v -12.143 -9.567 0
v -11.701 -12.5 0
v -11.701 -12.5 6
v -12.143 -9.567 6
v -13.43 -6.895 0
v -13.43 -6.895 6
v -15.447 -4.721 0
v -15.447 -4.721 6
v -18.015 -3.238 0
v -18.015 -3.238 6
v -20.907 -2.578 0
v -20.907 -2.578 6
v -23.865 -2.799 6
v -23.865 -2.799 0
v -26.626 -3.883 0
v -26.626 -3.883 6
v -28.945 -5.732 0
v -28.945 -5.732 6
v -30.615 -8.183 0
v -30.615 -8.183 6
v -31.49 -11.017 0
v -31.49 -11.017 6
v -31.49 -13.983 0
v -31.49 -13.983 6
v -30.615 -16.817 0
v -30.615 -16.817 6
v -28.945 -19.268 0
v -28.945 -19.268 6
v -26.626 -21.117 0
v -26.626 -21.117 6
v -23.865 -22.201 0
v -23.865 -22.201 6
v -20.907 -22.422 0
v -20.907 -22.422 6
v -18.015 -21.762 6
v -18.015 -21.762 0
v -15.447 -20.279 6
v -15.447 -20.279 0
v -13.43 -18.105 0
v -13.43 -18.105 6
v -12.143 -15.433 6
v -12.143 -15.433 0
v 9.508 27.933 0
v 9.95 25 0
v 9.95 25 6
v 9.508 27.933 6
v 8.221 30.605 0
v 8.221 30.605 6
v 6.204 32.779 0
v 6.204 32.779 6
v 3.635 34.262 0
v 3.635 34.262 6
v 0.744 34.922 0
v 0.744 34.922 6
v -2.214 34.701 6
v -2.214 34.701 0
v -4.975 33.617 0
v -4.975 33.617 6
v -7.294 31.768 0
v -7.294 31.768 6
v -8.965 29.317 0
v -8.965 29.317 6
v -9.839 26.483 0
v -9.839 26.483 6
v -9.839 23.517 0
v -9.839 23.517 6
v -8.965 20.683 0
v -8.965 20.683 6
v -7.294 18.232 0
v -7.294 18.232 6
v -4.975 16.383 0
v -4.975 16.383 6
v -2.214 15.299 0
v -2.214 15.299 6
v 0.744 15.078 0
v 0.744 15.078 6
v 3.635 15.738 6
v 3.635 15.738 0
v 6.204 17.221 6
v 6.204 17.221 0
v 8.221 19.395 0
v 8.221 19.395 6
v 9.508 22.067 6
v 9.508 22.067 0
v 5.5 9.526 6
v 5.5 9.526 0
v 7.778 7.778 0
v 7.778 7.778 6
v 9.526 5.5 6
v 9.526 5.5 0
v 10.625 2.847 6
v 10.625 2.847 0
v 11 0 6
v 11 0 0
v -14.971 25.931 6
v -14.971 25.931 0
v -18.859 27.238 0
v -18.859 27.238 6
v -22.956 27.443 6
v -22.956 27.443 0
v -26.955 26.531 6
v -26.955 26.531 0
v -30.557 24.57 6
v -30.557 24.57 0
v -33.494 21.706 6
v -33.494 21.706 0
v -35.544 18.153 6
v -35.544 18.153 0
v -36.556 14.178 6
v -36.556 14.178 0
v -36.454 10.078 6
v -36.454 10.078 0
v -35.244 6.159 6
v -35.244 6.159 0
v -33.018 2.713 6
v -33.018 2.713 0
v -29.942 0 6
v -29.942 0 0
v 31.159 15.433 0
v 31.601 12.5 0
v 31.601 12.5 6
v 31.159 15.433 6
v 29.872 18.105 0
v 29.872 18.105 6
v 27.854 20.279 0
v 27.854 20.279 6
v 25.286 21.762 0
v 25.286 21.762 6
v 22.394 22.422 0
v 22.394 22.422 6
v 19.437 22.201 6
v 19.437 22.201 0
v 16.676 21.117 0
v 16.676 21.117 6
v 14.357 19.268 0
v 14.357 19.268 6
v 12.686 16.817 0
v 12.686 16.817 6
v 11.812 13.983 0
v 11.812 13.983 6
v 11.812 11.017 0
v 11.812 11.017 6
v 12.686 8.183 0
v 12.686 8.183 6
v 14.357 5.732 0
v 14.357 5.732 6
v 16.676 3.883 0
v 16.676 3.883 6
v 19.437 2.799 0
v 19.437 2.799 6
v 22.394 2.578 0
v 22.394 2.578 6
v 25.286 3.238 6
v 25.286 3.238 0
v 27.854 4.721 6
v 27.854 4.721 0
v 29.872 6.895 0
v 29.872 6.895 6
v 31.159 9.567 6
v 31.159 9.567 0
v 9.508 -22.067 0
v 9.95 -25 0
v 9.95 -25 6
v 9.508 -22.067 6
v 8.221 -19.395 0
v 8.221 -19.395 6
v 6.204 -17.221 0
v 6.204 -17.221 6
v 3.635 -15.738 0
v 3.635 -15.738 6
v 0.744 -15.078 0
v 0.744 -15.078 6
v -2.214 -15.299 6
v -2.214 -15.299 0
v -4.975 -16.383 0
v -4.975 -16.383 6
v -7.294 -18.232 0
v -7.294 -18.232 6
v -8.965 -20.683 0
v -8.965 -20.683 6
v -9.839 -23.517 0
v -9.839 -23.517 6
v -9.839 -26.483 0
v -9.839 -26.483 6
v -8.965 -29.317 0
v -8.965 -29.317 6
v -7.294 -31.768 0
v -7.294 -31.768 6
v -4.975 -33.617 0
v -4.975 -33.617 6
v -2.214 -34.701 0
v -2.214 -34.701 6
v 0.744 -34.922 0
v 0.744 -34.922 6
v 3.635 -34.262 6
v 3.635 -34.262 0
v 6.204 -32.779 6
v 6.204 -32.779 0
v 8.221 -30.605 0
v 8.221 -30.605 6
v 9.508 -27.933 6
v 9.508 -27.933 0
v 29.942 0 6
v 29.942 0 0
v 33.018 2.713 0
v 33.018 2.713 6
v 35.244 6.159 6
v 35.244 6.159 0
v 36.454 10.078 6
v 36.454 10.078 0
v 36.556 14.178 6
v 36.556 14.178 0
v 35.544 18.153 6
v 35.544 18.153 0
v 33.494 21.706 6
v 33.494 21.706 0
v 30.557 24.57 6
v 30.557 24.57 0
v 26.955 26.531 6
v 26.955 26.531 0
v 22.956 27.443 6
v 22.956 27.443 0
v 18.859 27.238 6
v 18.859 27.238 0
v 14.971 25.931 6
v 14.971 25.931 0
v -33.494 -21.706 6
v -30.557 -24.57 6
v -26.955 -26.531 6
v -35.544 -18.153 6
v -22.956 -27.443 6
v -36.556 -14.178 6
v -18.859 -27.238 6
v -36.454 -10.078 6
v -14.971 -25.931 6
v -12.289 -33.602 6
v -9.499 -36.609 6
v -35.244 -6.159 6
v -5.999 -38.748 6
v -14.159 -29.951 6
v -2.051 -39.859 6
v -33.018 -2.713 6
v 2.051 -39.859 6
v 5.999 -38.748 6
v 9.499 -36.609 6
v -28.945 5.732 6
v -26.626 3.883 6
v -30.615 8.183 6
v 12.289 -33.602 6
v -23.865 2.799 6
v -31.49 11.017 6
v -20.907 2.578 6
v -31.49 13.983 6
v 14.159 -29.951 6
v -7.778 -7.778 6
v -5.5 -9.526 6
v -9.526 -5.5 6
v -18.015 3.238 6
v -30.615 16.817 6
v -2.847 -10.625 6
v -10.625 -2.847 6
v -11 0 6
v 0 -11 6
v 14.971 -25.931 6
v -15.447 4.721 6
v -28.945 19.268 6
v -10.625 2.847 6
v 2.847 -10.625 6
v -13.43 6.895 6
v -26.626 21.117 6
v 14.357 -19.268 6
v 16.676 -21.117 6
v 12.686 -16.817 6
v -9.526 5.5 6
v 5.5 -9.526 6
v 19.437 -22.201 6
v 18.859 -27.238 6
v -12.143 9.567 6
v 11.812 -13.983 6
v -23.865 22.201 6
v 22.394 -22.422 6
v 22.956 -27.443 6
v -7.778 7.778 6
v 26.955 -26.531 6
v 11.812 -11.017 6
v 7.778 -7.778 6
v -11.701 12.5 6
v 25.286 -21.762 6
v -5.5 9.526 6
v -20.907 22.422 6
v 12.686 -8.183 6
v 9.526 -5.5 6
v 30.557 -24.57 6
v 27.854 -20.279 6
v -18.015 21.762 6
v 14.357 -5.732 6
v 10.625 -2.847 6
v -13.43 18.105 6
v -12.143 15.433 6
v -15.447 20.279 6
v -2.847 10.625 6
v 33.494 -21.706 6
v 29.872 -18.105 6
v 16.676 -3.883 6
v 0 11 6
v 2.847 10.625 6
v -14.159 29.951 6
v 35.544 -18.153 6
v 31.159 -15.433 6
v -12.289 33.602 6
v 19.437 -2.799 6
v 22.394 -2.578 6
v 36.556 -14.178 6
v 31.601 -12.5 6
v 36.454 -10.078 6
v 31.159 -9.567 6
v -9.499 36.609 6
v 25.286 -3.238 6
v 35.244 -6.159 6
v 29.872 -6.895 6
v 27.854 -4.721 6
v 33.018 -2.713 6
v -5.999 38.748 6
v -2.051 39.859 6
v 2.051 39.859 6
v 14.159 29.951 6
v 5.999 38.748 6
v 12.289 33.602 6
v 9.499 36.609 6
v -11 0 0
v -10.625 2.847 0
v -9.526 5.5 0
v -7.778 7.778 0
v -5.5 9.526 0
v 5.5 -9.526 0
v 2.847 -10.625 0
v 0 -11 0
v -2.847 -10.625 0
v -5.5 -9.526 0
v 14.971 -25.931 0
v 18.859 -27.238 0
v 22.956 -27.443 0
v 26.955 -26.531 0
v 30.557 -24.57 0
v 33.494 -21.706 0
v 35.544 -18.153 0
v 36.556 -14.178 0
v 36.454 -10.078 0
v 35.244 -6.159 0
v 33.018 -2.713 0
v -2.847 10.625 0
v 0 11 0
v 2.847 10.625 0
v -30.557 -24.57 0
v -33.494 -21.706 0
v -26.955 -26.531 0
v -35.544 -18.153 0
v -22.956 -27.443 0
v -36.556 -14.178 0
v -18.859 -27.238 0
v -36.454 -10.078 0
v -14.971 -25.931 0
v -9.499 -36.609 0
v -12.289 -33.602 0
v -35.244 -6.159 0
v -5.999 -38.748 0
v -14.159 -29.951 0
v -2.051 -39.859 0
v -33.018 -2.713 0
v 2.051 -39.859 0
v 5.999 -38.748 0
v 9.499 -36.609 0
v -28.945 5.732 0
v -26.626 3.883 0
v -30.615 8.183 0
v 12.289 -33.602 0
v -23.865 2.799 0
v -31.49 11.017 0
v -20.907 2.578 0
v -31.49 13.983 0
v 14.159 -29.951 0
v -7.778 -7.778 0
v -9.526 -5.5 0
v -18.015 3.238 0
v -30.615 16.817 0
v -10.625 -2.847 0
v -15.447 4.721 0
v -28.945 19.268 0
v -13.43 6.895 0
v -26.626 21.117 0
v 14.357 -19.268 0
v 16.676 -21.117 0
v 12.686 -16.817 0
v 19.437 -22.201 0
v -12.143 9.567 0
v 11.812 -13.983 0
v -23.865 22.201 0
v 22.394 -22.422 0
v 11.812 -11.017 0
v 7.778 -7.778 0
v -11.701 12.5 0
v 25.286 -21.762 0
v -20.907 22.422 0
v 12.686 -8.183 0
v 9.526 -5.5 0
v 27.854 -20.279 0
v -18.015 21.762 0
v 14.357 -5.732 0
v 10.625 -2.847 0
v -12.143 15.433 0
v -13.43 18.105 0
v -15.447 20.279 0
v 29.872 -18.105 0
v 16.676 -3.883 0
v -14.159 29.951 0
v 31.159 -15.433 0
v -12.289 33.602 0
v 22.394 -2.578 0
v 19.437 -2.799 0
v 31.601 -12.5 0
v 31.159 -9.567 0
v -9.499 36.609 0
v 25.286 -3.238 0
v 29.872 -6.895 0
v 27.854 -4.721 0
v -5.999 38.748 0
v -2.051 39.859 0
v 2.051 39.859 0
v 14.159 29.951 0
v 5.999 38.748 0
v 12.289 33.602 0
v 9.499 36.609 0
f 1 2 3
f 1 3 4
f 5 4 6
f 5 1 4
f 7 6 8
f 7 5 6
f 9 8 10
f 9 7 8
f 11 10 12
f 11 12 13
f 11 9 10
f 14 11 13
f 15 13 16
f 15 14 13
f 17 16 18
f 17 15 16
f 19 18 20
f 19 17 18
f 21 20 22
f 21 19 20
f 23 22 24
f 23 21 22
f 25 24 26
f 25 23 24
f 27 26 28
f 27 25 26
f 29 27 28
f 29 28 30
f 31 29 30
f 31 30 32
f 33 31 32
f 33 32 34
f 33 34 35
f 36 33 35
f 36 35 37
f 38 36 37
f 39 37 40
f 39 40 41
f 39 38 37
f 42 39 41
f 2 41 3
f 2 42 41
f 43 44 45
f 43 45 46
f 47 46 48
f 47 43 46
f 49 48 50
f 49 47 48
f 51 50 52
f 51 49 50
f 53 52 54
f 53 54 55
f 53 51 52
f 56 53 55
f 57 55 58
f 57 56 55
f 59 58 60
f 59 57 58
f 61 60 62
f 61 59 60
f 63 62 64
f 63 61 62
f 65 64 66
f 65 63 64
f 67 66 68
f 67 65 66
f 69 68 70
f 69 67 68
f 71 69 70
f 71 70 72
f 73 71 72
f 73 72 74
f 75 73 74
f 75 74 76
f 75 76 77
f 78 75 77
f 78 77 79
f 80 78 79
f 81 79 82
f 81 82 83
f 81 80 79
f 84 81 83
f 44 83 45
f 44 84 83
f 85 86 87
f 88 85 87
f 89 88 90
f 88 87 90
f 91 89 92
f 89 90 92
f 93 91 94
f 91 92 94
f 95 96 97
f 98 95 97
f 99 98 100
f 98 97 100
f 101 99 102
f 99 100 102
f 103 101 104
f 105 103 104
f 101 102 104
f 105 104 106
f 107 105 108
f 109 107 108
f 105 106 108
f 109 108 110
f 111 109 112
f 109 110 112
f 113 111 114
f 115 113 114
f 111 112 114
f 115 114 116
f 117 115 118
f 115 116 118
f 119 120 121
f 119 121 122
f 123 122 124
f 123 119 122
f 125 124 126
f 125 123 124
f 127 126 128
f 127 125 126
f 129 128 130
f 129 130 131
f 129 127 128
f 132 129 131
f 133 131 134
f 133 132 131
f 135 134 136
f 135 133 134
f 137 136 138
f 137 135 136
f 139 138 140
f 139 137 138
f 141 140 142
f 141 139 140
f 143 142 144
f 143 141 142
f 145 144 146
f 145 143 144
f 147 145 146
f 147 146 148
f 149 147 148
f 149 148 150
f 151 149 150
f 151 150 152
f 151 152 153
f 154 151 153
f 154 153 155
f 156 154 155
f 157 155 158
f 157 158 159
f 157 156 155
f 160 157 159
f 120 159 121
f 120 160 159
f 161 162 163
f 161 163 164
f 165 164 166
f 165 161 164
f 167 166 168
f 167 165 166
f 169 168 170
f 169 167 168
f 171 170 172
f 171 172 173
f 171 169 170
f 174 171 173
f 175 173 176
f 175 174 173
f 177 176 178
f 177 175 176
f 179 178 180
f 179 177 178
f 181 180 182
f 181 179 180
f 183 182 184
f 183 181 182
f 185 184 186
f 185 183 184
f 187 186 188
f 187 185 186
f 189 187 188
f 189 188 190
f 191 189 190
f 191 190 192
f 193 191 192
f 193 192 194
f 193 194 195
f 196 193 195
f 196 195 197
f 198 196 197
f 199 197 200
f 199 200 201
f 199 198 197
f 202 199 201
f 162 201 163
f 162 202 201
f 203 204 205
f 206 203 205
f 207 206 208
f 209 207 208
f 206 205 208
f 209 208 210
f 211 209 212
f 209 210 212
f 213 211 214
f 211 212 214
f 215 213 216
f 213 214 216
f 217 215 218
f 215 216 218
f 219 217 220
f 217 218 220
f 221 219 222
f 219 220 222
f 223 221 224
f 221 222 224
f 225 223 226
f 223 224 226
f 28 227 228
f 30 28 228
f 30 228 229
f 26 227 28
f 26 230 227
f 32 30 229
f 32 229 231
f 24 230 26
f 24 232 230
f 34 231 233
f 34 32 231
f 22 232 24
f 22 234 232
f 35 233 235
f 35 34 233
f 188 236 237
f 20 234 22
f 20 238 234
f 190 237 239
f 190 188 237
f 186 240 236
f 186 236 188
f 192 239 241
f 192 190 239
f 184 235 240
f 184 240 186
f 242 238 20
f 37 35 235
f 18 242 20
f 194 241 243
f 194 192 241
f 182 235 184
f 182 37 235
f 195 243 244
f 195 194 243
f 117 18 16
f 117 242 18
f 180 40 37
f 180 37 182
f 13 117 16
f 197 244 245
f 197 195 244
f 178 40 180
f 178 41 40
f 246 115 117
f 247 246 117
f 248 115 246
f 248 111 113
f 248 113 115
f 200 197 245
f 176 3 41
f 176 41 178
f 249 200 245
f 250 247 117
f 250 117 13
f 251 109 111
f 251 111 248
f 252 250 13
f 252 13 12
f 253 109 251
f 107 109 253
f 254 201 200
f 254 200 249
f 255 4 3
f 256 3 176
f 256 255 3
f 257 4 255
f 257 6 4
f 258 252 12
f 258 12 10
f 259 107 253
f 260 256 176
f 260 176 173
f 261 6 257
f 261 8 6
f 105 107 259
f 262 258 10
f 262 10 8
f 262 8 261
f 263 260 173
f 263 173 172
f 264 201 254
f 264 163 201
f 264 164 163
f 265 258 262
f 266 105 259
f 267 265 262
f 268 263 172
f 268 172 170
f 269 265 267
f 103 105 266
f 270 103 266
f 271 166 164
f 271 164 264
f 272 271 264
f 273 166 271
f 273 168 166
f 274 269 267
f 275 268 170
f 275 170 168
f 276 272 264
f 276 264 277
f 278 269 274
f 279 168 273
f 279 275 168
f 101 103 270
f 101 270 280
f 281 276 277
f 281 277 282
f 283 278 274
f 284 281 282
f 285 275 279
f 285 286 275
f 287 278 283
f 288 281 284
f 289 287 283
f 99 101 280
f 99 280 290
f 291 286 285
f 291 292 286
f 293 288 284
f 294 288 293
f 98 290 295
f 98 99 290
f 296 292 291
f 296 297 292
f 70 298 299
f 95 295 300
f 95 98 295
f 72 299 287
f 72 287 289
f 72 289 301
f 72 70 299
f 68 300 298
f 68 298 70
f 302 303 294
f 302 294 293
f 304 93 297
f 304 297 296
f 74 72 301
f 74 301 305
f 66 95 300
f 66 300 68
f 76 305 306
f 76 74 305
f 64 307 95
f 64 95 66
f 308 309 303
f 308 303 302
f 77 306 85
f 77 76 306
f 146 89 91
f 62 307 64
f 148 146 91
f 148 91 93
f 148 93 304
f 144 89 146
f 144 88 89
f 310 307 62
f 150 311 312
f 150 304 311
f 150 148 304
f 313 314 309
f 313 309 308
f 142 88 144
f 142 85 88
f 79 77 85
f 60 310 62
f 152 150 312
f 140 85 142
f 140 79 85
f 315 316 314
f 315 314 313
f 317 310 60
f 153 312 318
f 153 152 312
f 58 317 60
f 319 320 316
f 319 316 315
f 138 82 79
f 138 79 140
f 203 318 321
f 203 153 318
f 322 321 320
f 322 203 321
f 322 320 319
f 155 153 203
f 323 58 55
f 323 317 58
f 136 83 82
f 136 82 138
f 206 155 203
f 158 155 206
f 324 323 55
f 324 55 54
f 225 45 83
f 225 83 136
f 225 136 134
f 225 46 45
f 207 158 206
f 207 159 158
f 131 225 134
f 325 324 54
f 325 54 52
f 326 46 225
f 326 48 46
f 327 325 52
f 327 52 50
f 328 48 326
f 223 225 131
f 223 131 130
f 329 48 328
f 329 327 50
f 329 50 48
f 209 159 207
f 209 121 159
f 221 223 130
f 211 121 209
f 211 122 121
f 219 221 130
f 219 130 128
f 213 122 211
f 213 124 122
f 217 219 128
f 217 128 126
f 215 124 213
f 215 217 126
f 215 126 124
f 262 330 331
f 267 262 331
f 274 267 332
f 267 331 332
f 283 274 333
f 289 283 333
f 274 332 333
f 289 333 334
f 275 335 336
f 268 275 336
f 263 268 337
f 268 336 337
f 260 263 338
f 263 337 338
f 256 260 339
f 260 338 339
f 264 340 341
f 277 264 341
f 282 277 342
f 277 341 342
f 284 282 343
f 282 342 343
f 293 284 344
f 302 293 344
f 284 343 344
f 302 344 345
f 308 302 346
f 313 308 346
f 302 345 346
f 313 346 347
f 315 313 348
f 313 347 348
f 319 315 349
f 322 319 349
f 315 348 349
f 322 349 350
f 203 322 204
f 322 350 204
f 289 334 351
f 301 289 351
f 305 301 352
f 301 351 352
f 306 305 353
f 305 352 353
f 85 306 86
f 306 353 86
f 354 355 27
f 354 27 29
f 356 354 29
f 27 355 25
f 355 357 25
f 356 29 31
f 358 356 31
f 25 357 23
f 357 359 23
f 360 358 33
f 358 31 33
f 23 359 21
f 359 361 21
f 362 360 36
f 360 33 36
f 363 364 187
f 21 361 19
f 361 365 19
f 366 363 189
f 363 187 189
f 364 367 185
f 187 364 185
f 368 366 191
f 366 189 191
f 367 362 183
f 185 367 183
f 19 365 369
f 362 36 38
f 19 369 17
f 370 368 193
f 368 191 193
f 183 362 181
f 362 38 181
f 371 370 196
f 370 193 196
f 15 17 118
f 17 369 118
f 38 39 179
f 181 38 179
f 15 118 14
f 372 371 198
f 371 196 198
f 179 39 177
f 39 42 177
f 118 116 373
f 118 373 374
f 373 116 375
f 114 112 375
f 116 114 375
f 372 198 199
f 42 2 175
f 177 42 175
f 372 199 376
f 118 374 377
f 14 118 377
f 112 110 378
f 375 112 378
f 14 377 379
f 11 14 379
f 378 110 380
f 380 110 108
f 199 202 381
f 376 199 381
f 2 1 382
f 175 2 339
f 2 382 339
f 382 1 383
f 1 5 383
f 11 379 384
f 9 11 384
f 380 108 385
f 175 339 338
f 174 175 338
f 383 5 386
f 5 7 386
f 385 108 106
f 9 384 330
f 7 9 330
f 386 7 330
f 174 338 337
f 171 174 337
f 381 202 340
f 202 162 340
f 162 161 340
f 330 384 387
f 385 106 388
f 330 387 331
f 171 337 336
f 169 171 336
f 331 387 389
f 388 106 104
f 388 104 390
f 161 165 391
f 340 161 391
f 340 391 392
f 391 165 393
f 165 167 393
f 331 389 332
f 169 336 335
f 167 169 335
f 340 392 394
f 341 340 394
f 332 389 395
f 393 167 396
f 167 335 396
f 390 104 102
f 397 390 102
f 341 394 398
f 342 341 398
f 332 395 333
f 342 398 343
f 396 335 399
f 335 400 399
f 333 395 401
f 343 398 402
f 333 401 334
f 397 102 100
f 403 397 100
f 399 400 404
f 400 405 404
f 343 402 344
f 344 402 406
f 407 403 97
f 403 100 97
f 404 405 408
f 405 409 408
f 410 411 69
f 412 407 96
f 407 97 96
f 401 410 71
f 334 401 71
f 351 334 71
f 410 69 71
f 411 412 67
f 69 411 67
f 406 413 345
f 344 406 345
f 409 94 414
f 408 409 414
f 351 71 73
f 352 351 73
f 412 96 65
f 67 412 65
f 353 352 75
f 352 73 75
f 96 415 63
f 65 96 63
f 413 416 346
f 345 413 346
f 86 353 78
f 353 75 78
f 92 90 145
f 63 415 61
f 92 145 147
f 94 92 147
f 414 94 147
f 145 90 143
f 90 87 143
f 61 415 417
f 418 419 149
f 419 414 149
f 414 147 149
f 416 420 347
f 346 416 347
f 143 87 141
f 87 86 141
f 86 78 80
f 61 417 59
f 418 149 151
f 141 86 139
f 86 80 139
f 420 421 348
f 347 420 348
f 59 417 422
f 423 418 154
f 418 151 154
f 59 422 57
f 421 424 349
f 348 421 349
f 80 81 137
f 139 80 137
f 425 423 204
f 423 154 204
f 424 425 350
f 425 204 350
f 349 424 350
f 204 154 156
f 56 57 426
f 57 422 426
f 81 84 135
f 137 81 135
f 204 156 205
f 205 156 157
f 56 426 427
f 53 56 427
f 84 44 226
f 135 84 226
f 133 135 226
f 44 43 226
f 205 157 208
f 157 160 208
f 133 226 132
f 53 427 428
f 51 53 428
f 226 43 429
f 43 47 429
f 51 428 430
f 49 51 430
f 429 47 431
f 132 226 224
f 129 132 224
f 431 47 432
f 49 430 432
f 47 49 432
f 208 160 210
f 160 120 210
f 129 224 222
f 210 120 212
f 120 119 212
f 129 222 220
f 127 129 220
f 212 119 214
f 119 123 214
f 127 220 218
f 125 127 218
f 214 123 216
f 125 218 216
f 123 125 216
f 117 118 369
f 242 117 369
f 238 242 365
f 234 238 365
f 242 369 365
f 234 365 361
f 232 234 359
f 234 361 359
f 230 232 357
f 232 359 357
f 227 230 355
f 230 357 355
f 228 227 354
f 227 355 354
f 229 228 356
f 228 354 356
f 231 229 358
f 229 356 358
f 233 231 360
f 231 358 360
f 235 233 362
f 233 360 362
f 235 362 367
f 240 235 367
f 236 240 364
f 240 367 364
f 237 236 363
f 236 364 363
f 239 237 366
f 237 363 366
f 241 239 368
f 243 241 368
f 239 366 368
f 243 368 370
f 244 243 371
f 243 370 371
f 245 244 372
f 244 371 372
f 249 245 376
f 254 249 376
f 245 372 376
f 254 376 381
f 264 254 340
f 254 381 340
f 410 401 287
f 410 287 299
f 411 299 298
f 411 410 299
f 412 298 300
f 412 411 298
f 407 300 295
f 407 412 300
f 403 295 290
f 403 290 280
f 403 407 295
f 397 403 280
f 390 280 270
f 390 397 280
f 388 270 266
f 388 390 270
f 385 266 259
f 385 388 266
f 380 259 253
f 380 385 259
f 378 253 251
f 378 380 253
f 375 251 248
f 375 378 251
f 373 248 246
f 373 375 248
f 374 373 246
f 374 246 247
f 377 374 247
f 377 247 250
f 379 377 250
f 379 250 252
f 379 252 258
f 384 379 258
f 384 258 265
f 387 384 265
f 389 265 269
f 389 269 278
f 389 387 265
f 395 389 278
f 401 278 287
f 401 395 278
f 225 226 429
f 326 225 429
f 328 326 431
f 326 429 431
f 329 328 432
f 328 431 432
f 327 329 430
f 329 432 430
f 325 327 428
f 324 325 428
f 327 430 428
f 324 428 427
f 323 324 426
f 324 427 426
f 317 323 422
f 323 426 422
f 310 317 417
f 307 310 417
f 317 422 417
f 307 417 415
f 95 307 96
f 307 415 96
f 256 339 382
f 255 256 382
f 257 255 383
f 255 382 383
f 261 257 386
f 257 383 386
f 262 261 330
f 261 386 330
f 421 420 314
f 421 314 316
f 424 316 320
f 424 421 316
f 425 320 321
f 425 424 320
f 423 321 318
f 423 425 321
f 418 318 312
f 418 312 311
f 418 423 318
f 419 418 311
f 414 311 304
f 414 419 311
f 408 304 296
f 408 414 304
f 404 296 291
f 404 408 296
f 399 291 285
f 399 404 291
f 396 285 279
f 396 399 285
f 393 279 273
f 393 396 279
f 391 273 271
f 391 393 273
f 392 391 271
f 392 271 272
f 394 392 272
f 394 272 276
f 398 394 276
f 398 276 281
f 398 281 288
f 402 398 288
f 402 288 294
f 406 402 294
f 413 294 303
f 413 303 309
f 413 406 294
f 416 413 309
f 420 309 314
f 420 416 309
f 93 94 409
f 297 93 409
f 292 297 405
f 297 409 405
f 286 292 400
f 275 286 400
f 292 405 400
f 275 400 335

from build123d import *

# Parameters (mm, degrees)
F0_R     = 9.95
F1_DEPTH = 6


with BuildPart() as f1:
    # F0 (on Top) → F1 (new body)
    with BuildSketch(Plane.XY):
        with BuildLine():
            ThreePointArc((29.942197, 0), (34.641016, 20), (14.971099, 25.930703))
            ThreePointArc((14.971099, 25.930703), (0, 40), (-14.971099, 25.930703))
            ThreePointArc((-14.971099, 25.930703), (-34.641016, 20), (-29.942197, 0))
            ThreePointArc((-29.942197, 0), (-34.641016, -20), (-14.971099, -25.930703))
            ThreePointArc((-14.971099, -25.930703), (0, -40), (14.971099, -25.930703))
            ThreePointArc((14.971099, -25.930703), (34.641016, -20), (29.942197, 0))
        make_face()
        with Locations((0, -25)):
            Circle(F0_R, mode=Mode.SUBTRACT)
        with Locations((-21.650635, -12.5)):
            Circle(F0_R, mode=Mode.SUBTRACT)
        with Locations((21.650635, -12.5)):
            Circle(F0_R, mode=Mode.SUBTRACT)
        with Locations((-21.650635, 12.5)):
            Circle(F0_R, mode=Mode.SUBTRACT)
        with BuildLine():
            ThreePointArc((-5.5, 9.526279), (0, 11), (5.5, 9.526279))
            ThreePointArc((5.5, 9.526279), (9.526279, 5.5), (11, 0))
            ThreePointArc((11, 0), (9.526279, -5.5), (5.5, -9.526279))
            ThreePointArc((5.5, -9.526279), (0, -11), (-5.5, -9.526279))
            ThreePointArc((-5.5, -9.526279), (-9.526279, -5.5), (-11, 0))
            ThreePointArc((-11, 0), (-9.526279, 5.5), (-5.5, 9.526279))
        make_face(mode=Mode.SUBTRACT)
        with Locations((0, 25)):
            Circle(F0_R, mode=Mode.SUBTRACT)
        with Locations((21.650635, 12.5)):
            Circle(F0_R, mode=Mode.SUBTRACT)
    extrude(amount=F1_DEPTH)


solid = f1.part
